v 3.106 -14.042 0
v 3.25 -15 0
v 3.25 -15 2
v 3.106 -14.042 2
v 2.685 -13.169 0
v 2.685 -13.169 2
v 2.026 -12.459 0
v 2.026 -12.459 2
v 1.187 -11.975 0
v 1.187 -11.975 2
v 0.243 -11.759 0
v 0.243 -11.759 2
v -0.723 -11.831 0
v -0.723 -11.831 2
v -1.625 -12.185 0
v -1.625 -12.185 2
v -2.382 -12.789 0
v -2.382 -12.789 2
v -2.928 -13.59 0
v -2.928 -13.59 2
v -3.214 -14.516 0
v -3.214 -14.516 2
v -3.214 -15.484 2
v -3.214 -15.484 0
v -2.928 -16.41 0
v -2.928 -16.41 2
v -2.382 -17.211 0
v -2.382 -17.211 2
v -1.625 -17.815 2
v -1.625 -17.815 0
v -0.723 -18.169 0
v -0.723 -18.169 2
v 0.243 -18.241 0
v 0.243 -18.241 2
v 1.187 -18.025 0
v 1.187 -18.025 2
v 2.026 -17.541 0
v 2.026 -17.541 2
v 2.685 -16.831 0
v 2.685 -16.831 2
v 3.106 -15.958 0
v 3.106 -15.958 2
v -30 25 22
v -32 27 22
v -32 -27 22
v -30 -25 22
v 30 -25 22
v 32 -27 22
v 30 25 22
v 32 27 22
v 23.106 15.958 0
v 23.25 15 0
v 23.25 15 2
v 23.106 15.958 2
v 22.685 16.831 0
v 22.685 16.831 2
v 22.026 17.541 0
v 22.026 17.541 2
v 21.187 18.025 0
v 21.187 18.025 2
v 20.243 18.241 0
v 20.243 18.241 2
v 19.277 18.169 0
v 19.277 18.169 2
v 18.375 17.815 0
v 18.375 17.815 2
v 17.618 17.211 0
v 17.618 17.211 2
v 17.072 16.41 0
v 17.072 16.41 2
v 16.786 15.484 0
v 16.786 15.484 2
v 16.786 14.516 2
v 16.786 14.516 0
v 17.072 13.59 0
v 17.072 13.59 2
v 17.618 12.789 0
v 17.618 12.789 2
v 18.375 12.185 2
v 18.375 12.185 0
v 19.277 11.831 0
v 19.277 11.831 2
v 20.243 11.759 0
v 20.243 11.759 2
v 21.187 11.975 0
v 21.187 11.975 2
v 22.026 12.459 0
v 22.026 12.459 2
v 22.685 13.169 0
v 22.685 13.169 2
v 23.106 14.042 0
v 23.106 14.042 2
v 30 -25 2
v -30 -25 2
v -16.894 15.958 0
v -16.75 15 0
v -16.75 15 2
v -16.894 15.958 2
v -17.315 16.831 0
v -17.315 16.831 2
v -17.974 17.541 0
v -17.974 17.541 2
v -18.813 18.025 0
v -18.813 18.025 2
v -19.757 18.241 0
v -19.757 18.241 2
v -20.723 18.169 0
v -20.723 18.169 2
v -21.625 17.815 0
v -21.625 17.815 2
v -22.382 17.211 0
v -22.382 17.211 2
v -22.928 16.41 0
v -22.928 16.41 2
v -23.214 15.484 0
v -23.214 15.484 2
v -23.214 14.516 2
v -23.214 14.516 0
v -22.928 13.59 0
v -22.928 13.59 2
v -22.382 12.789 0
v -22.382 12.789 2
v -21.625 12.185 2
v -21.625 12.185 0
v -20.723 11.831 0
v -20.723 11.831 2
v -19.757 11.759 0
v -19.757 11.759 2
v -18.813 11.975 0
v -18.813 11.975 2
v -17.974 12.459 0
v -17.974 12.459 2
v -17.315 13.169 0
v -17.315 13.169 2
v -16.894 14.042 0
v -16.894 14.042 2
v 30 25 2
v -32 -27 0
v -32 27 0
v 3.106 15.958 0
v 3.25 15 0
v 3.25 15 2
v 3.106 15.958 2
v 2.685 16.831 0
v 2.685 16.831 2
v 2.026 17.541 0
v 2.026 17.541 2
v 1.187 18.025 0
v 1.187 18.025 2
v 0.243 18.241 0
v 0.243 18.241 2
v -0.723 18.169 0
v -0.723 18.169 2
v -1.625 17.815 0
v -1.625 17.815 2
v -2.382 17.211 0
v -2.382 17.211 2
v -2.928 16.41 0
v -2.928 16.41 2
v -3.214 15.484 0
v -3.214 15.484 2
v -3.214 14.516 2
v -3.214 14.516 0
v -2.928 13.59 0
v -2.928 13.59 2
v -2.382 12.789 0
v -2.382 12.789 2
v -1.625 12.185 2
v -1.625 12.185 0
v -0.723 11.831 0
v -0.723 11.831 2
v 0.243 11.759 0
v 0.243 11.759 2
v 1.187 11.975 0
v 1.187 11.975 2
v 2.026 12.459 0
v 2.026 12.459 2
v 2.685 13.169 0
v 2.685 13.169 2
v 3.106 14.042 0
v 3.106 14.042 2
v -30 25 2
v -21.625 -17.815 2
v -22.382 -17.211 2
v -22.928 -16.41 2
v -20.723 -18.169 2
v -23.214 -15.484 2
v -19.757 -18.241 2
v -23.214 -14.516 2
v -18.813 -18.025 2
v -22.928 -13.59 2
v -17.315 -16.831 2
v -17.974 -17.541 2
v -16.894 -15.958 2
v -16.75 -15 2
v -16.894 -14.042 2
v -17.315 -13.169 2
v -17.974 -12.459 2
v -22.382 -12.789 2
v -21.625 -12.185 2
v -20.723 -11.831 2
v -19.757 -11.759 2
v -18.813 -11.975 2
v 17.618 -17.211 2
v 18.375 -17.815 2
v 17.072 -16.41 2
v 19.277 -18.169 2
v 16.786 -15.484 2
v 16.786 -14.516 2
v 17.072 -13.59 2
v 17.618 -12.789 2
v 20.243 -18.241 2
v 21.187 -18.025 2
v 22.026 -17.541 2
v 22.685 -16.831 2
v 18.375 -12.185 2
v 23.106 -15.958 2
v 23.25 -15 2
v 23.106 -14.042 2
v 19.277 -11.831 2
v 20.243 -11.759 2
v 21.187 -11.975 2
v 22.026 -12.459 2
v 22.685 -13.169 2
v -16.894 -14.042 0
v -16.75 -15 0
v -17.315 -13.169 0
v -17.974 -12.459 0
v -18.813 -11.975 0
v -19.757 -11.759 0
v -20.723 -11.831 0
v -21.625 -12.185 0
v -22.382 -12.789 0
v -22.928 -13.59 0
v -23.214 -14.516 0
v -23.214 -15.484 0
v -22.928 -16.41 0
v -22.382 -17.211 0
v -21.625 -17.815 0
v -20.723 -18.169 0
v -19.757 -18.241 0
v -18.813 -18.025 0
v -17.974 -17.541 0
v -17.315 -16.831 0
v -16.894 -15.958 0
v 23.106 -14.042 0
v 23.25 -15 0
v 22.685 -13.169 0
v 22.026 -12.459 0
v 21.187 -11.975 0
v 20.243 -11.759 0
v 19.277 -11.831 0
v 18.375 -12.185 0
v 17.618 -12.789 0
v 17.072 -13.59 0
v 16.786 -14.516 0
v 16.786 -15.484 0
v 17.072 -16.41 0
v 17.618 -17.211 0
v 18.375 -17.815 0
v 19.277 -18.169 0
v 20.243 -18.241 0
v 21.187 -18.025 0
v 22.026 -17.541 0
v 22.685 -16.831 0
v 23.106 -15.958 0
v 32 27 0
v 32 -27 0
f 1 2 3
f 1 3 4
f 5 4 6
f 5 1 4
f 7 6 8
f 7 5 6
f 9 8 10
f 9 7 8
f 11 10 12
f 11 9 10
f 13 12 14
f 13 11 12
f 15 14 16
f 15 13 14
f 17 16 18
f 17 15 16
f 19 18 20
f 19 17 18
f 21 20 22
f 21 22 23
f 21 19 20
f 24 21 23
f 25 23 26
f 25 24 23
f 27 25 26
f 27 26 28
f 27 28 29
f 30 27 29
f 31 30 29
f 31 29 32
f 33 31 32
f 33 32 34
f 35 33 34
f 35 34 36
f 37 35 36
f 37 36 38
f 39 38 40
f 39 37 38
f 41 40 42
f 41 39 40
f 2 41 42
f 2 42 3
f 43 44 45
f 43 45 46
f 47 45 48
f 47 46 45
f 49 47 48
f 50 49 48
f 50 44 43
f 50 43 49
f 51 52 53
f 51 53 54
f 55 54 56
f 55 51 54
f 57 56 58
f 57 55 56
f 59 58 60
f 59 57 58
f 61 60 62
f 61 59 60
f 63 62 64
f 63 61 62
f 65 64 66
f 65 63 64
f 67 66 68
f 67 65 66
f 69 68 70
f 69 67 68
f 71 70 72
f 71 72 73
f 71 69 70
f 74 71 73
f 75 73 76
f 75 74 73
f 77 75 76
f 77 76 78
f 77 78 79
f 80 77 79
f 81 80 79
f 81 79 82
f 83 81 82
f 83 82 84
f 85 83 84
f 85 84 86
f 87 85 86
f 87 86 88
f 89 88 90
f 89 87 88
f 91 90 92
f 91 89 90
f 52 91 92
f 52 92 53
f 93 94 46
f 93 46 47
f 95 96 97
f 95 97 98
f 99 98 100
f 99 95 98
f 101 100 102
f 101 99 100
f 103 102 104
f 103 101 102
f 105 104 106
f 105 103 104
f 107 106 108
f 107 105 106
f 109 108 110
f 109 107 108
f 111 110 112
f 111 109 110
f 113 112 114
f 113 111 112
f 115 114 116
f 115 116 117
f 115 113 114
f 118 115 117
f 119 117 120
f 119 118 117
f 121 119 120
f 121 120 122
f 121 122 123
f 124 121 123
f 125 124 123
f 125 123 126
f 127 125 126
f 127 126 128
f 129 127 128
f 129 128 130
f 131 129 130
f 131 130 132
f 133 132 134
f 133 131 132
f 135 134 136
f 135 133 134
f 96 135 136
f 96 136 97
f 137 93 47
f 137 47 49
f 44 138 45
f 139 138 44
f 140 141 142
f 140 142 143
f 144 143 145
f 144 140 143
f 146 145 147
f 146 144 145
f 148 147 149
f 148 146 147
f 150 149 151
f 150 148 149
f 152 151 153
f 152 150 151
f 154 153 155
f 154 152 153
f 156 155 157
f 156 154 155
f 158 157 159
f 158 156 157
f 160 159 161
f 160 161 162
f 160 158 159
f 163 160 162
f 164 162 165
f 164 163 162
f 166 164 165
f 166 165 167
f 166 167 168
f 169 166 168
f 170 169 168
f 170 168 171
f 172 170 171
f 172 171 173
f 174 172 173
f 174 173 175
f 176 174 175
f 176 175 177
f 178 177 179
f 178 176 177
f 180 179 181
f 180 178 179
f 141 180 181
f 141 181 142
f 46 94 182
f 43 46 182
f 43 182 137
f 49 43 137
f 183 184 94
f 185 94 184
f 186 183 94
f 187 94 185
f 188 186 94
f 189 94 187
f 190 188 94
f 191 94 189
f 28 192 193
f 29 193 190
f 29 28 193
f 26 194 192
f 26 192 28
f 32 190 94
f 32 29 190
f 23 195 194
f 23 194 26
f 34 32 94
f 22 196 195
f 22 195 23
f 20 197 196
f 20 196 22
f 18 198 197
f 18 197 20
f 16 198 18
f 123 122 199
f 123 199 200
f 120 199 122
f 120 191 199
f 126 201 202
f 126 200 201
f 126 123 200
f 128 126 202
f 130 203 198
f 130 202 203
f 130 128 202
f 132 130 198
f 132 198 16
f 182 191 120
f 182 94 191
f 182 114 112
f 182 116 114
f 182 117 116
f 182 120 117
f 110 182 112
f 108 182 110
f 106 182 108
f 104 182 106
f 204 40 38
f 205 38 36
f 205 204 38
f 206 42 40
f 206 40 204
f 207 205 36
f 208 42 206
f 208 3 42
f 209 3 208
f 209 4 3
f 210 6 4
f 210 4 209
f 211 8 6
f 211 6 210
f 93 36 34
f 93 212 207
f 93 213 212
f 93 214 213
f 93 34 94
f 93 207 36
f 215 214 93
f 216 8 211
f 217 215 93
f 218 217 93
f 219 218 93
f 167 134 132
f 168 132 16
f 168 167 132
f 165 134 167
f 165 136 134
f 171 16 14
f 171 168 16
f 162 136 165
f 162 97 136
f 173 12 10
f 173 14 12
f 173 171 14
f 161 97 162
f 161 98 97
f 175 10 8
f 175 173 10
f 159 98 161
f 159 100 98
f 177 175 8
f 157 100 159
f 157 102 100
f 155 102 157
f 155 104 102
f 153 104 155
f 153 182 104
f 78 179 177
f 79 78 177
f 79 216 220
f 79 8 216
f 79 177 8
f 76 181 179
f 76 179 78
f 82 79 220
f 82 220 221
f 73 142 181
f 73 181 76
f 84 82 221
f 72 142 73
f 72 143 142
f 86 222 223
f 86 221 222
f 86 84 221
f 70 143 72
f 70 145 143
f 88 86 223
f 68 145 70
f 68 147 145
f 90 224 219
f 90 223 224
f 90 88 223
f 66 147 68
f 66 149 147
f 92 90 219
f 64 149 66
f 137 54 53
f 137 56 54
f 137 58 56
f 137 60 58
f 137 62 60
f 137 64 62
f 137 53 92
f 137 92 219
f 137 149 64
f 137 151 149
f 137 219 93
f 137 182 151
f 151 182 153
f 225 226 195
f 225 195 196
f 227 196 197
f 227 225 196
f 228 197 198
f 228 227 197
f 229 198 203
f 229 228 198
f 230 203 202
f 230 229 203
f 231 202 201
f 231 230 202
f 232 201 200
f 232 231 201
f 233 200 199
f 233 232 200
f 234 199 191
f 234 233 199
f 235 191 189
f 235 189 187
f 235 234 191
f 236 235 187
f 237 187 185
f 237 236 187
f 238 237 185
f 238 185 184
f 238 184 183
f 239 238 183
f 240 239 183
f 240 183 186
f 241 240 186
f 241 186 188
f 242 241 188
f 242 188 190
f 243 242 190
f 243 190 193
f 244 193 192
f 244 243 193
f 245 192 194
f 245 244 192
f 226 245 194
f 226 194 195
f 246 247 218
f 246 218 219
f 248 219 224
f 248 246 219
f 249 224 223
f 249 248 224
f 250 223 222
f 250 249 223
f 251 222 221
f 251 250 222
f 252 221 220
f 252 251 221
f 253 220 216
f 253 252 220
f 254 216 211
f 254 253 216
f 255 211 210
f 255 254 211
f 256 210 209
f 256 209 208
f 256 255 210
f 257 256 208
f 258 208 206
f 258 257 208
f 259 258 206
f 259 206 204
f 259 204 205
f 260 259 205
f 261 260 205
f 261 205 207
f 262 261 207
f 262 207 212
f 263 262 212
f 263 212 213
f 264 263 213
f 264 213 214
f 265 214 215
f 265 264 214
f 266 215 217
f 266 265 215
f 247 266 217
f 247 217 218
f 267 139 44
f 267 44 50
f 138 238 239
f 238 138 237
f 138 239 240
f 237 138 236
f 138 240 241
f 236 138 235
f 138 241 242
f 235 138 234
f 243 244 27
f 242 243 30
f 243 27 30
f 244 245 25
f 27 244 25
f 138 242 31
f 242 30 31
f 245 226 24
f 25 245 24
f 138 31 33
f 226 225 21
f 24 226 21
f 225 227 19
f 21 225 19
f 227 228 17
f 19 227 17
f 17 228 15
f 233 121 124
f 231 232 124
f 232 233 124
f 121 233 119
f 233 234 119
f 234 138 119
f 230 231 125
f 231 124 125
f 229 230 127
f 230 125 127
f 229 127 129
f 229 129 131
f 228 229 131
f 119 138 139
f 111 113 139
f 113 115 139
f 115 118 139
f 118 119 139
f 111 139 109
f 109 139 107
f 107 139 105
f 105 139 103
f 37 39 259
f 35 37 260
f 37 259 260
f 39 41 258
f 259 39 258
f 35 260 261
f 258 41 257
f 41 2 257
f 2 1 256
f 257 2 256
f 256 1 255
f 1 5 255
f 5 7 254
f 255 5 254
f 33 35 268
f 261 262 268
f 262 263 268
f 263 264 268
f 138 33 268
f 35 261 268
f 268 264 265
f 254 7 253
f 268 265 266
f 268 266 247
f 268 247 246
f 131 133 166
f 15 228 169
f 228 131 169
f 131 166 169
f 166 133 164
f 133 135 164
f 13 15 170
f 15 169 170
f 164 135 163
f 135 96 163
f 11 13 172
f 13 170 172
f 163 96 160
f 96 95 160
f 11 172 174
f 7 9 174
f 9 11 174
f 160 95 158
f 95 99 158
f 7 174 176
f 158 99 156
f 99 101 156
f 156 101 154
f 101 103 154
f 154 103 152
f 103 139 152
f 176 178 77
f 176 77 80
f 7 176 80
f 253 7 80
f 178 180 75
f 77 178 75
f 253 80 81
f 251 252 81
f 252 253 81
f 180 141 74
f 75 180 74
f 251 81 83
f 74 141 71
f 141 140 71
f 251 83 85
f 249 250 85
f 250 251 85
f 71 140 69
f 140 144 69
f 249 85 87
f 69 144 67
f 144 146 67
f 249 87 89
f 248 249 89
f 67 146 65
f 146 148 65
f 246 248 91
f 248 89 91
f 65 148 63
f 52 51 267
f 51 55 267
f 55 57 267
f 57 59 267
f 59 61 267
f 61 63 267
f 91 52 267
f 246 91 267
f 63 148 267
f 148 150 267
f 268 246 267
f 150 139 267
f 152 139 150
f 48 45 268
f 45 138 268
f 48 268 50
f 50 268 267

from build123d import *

# Parameters (mm, degrees)
F0_W     = 64
F0_H     = 54
F0_W_2   = 60
F0_H_2   = 50
F0_R     = 3.25
F1_DEPTH = 2
F2_W     = 64
F2_H     = 54
F2_W_2   = 60
F2_H_2   = 50
F3_DEPTH = 20


with BuildPart() as f1:
    # F0 (on Top) → F1 (new body)
    with BuildSketch(Plane.XY):
        Rectangle(F0_W, F0_H)
        Rectangle(F0_W_2, F0_H_2, mode=Mode.SUBTRACT)
        Rectangle(F0_W_2, F0_H_2)
        with Locations((-20, -15)):
            Circle(F0_R, mode=Mode.SUBTRACT)
        with Locations((0, -15)):
            Circle(F0_R, mode=Mode.SUBTRACT)
        with Locations((20, -15)):
            Circle(F0_R, mode=Mode.SUBTRACT)
        with Locations((-20, 15)):
            Circle(F0_R, mode=Mode.SUBTRACT)
        with Locations((0, 15)):
            Circle(F0_R, mode=Mode.SUBTRACT)
        with Locations((20, 15)):
            Circle(F0_R, mode=Mode.SUBTRACT)
    extrude(amount=F1_DEPTH)

    # F2 (on face) → F3 (join)
    with BuildSketch(Plane.XY.offset(2)):
        Rectangle(F2_W, F2_H)
        Rectangle(F2_W_2, F2_H_2, mode=Mode.SUBTRACT)
    extrude(amount=F3_DEPTH)


solid = f1.part
